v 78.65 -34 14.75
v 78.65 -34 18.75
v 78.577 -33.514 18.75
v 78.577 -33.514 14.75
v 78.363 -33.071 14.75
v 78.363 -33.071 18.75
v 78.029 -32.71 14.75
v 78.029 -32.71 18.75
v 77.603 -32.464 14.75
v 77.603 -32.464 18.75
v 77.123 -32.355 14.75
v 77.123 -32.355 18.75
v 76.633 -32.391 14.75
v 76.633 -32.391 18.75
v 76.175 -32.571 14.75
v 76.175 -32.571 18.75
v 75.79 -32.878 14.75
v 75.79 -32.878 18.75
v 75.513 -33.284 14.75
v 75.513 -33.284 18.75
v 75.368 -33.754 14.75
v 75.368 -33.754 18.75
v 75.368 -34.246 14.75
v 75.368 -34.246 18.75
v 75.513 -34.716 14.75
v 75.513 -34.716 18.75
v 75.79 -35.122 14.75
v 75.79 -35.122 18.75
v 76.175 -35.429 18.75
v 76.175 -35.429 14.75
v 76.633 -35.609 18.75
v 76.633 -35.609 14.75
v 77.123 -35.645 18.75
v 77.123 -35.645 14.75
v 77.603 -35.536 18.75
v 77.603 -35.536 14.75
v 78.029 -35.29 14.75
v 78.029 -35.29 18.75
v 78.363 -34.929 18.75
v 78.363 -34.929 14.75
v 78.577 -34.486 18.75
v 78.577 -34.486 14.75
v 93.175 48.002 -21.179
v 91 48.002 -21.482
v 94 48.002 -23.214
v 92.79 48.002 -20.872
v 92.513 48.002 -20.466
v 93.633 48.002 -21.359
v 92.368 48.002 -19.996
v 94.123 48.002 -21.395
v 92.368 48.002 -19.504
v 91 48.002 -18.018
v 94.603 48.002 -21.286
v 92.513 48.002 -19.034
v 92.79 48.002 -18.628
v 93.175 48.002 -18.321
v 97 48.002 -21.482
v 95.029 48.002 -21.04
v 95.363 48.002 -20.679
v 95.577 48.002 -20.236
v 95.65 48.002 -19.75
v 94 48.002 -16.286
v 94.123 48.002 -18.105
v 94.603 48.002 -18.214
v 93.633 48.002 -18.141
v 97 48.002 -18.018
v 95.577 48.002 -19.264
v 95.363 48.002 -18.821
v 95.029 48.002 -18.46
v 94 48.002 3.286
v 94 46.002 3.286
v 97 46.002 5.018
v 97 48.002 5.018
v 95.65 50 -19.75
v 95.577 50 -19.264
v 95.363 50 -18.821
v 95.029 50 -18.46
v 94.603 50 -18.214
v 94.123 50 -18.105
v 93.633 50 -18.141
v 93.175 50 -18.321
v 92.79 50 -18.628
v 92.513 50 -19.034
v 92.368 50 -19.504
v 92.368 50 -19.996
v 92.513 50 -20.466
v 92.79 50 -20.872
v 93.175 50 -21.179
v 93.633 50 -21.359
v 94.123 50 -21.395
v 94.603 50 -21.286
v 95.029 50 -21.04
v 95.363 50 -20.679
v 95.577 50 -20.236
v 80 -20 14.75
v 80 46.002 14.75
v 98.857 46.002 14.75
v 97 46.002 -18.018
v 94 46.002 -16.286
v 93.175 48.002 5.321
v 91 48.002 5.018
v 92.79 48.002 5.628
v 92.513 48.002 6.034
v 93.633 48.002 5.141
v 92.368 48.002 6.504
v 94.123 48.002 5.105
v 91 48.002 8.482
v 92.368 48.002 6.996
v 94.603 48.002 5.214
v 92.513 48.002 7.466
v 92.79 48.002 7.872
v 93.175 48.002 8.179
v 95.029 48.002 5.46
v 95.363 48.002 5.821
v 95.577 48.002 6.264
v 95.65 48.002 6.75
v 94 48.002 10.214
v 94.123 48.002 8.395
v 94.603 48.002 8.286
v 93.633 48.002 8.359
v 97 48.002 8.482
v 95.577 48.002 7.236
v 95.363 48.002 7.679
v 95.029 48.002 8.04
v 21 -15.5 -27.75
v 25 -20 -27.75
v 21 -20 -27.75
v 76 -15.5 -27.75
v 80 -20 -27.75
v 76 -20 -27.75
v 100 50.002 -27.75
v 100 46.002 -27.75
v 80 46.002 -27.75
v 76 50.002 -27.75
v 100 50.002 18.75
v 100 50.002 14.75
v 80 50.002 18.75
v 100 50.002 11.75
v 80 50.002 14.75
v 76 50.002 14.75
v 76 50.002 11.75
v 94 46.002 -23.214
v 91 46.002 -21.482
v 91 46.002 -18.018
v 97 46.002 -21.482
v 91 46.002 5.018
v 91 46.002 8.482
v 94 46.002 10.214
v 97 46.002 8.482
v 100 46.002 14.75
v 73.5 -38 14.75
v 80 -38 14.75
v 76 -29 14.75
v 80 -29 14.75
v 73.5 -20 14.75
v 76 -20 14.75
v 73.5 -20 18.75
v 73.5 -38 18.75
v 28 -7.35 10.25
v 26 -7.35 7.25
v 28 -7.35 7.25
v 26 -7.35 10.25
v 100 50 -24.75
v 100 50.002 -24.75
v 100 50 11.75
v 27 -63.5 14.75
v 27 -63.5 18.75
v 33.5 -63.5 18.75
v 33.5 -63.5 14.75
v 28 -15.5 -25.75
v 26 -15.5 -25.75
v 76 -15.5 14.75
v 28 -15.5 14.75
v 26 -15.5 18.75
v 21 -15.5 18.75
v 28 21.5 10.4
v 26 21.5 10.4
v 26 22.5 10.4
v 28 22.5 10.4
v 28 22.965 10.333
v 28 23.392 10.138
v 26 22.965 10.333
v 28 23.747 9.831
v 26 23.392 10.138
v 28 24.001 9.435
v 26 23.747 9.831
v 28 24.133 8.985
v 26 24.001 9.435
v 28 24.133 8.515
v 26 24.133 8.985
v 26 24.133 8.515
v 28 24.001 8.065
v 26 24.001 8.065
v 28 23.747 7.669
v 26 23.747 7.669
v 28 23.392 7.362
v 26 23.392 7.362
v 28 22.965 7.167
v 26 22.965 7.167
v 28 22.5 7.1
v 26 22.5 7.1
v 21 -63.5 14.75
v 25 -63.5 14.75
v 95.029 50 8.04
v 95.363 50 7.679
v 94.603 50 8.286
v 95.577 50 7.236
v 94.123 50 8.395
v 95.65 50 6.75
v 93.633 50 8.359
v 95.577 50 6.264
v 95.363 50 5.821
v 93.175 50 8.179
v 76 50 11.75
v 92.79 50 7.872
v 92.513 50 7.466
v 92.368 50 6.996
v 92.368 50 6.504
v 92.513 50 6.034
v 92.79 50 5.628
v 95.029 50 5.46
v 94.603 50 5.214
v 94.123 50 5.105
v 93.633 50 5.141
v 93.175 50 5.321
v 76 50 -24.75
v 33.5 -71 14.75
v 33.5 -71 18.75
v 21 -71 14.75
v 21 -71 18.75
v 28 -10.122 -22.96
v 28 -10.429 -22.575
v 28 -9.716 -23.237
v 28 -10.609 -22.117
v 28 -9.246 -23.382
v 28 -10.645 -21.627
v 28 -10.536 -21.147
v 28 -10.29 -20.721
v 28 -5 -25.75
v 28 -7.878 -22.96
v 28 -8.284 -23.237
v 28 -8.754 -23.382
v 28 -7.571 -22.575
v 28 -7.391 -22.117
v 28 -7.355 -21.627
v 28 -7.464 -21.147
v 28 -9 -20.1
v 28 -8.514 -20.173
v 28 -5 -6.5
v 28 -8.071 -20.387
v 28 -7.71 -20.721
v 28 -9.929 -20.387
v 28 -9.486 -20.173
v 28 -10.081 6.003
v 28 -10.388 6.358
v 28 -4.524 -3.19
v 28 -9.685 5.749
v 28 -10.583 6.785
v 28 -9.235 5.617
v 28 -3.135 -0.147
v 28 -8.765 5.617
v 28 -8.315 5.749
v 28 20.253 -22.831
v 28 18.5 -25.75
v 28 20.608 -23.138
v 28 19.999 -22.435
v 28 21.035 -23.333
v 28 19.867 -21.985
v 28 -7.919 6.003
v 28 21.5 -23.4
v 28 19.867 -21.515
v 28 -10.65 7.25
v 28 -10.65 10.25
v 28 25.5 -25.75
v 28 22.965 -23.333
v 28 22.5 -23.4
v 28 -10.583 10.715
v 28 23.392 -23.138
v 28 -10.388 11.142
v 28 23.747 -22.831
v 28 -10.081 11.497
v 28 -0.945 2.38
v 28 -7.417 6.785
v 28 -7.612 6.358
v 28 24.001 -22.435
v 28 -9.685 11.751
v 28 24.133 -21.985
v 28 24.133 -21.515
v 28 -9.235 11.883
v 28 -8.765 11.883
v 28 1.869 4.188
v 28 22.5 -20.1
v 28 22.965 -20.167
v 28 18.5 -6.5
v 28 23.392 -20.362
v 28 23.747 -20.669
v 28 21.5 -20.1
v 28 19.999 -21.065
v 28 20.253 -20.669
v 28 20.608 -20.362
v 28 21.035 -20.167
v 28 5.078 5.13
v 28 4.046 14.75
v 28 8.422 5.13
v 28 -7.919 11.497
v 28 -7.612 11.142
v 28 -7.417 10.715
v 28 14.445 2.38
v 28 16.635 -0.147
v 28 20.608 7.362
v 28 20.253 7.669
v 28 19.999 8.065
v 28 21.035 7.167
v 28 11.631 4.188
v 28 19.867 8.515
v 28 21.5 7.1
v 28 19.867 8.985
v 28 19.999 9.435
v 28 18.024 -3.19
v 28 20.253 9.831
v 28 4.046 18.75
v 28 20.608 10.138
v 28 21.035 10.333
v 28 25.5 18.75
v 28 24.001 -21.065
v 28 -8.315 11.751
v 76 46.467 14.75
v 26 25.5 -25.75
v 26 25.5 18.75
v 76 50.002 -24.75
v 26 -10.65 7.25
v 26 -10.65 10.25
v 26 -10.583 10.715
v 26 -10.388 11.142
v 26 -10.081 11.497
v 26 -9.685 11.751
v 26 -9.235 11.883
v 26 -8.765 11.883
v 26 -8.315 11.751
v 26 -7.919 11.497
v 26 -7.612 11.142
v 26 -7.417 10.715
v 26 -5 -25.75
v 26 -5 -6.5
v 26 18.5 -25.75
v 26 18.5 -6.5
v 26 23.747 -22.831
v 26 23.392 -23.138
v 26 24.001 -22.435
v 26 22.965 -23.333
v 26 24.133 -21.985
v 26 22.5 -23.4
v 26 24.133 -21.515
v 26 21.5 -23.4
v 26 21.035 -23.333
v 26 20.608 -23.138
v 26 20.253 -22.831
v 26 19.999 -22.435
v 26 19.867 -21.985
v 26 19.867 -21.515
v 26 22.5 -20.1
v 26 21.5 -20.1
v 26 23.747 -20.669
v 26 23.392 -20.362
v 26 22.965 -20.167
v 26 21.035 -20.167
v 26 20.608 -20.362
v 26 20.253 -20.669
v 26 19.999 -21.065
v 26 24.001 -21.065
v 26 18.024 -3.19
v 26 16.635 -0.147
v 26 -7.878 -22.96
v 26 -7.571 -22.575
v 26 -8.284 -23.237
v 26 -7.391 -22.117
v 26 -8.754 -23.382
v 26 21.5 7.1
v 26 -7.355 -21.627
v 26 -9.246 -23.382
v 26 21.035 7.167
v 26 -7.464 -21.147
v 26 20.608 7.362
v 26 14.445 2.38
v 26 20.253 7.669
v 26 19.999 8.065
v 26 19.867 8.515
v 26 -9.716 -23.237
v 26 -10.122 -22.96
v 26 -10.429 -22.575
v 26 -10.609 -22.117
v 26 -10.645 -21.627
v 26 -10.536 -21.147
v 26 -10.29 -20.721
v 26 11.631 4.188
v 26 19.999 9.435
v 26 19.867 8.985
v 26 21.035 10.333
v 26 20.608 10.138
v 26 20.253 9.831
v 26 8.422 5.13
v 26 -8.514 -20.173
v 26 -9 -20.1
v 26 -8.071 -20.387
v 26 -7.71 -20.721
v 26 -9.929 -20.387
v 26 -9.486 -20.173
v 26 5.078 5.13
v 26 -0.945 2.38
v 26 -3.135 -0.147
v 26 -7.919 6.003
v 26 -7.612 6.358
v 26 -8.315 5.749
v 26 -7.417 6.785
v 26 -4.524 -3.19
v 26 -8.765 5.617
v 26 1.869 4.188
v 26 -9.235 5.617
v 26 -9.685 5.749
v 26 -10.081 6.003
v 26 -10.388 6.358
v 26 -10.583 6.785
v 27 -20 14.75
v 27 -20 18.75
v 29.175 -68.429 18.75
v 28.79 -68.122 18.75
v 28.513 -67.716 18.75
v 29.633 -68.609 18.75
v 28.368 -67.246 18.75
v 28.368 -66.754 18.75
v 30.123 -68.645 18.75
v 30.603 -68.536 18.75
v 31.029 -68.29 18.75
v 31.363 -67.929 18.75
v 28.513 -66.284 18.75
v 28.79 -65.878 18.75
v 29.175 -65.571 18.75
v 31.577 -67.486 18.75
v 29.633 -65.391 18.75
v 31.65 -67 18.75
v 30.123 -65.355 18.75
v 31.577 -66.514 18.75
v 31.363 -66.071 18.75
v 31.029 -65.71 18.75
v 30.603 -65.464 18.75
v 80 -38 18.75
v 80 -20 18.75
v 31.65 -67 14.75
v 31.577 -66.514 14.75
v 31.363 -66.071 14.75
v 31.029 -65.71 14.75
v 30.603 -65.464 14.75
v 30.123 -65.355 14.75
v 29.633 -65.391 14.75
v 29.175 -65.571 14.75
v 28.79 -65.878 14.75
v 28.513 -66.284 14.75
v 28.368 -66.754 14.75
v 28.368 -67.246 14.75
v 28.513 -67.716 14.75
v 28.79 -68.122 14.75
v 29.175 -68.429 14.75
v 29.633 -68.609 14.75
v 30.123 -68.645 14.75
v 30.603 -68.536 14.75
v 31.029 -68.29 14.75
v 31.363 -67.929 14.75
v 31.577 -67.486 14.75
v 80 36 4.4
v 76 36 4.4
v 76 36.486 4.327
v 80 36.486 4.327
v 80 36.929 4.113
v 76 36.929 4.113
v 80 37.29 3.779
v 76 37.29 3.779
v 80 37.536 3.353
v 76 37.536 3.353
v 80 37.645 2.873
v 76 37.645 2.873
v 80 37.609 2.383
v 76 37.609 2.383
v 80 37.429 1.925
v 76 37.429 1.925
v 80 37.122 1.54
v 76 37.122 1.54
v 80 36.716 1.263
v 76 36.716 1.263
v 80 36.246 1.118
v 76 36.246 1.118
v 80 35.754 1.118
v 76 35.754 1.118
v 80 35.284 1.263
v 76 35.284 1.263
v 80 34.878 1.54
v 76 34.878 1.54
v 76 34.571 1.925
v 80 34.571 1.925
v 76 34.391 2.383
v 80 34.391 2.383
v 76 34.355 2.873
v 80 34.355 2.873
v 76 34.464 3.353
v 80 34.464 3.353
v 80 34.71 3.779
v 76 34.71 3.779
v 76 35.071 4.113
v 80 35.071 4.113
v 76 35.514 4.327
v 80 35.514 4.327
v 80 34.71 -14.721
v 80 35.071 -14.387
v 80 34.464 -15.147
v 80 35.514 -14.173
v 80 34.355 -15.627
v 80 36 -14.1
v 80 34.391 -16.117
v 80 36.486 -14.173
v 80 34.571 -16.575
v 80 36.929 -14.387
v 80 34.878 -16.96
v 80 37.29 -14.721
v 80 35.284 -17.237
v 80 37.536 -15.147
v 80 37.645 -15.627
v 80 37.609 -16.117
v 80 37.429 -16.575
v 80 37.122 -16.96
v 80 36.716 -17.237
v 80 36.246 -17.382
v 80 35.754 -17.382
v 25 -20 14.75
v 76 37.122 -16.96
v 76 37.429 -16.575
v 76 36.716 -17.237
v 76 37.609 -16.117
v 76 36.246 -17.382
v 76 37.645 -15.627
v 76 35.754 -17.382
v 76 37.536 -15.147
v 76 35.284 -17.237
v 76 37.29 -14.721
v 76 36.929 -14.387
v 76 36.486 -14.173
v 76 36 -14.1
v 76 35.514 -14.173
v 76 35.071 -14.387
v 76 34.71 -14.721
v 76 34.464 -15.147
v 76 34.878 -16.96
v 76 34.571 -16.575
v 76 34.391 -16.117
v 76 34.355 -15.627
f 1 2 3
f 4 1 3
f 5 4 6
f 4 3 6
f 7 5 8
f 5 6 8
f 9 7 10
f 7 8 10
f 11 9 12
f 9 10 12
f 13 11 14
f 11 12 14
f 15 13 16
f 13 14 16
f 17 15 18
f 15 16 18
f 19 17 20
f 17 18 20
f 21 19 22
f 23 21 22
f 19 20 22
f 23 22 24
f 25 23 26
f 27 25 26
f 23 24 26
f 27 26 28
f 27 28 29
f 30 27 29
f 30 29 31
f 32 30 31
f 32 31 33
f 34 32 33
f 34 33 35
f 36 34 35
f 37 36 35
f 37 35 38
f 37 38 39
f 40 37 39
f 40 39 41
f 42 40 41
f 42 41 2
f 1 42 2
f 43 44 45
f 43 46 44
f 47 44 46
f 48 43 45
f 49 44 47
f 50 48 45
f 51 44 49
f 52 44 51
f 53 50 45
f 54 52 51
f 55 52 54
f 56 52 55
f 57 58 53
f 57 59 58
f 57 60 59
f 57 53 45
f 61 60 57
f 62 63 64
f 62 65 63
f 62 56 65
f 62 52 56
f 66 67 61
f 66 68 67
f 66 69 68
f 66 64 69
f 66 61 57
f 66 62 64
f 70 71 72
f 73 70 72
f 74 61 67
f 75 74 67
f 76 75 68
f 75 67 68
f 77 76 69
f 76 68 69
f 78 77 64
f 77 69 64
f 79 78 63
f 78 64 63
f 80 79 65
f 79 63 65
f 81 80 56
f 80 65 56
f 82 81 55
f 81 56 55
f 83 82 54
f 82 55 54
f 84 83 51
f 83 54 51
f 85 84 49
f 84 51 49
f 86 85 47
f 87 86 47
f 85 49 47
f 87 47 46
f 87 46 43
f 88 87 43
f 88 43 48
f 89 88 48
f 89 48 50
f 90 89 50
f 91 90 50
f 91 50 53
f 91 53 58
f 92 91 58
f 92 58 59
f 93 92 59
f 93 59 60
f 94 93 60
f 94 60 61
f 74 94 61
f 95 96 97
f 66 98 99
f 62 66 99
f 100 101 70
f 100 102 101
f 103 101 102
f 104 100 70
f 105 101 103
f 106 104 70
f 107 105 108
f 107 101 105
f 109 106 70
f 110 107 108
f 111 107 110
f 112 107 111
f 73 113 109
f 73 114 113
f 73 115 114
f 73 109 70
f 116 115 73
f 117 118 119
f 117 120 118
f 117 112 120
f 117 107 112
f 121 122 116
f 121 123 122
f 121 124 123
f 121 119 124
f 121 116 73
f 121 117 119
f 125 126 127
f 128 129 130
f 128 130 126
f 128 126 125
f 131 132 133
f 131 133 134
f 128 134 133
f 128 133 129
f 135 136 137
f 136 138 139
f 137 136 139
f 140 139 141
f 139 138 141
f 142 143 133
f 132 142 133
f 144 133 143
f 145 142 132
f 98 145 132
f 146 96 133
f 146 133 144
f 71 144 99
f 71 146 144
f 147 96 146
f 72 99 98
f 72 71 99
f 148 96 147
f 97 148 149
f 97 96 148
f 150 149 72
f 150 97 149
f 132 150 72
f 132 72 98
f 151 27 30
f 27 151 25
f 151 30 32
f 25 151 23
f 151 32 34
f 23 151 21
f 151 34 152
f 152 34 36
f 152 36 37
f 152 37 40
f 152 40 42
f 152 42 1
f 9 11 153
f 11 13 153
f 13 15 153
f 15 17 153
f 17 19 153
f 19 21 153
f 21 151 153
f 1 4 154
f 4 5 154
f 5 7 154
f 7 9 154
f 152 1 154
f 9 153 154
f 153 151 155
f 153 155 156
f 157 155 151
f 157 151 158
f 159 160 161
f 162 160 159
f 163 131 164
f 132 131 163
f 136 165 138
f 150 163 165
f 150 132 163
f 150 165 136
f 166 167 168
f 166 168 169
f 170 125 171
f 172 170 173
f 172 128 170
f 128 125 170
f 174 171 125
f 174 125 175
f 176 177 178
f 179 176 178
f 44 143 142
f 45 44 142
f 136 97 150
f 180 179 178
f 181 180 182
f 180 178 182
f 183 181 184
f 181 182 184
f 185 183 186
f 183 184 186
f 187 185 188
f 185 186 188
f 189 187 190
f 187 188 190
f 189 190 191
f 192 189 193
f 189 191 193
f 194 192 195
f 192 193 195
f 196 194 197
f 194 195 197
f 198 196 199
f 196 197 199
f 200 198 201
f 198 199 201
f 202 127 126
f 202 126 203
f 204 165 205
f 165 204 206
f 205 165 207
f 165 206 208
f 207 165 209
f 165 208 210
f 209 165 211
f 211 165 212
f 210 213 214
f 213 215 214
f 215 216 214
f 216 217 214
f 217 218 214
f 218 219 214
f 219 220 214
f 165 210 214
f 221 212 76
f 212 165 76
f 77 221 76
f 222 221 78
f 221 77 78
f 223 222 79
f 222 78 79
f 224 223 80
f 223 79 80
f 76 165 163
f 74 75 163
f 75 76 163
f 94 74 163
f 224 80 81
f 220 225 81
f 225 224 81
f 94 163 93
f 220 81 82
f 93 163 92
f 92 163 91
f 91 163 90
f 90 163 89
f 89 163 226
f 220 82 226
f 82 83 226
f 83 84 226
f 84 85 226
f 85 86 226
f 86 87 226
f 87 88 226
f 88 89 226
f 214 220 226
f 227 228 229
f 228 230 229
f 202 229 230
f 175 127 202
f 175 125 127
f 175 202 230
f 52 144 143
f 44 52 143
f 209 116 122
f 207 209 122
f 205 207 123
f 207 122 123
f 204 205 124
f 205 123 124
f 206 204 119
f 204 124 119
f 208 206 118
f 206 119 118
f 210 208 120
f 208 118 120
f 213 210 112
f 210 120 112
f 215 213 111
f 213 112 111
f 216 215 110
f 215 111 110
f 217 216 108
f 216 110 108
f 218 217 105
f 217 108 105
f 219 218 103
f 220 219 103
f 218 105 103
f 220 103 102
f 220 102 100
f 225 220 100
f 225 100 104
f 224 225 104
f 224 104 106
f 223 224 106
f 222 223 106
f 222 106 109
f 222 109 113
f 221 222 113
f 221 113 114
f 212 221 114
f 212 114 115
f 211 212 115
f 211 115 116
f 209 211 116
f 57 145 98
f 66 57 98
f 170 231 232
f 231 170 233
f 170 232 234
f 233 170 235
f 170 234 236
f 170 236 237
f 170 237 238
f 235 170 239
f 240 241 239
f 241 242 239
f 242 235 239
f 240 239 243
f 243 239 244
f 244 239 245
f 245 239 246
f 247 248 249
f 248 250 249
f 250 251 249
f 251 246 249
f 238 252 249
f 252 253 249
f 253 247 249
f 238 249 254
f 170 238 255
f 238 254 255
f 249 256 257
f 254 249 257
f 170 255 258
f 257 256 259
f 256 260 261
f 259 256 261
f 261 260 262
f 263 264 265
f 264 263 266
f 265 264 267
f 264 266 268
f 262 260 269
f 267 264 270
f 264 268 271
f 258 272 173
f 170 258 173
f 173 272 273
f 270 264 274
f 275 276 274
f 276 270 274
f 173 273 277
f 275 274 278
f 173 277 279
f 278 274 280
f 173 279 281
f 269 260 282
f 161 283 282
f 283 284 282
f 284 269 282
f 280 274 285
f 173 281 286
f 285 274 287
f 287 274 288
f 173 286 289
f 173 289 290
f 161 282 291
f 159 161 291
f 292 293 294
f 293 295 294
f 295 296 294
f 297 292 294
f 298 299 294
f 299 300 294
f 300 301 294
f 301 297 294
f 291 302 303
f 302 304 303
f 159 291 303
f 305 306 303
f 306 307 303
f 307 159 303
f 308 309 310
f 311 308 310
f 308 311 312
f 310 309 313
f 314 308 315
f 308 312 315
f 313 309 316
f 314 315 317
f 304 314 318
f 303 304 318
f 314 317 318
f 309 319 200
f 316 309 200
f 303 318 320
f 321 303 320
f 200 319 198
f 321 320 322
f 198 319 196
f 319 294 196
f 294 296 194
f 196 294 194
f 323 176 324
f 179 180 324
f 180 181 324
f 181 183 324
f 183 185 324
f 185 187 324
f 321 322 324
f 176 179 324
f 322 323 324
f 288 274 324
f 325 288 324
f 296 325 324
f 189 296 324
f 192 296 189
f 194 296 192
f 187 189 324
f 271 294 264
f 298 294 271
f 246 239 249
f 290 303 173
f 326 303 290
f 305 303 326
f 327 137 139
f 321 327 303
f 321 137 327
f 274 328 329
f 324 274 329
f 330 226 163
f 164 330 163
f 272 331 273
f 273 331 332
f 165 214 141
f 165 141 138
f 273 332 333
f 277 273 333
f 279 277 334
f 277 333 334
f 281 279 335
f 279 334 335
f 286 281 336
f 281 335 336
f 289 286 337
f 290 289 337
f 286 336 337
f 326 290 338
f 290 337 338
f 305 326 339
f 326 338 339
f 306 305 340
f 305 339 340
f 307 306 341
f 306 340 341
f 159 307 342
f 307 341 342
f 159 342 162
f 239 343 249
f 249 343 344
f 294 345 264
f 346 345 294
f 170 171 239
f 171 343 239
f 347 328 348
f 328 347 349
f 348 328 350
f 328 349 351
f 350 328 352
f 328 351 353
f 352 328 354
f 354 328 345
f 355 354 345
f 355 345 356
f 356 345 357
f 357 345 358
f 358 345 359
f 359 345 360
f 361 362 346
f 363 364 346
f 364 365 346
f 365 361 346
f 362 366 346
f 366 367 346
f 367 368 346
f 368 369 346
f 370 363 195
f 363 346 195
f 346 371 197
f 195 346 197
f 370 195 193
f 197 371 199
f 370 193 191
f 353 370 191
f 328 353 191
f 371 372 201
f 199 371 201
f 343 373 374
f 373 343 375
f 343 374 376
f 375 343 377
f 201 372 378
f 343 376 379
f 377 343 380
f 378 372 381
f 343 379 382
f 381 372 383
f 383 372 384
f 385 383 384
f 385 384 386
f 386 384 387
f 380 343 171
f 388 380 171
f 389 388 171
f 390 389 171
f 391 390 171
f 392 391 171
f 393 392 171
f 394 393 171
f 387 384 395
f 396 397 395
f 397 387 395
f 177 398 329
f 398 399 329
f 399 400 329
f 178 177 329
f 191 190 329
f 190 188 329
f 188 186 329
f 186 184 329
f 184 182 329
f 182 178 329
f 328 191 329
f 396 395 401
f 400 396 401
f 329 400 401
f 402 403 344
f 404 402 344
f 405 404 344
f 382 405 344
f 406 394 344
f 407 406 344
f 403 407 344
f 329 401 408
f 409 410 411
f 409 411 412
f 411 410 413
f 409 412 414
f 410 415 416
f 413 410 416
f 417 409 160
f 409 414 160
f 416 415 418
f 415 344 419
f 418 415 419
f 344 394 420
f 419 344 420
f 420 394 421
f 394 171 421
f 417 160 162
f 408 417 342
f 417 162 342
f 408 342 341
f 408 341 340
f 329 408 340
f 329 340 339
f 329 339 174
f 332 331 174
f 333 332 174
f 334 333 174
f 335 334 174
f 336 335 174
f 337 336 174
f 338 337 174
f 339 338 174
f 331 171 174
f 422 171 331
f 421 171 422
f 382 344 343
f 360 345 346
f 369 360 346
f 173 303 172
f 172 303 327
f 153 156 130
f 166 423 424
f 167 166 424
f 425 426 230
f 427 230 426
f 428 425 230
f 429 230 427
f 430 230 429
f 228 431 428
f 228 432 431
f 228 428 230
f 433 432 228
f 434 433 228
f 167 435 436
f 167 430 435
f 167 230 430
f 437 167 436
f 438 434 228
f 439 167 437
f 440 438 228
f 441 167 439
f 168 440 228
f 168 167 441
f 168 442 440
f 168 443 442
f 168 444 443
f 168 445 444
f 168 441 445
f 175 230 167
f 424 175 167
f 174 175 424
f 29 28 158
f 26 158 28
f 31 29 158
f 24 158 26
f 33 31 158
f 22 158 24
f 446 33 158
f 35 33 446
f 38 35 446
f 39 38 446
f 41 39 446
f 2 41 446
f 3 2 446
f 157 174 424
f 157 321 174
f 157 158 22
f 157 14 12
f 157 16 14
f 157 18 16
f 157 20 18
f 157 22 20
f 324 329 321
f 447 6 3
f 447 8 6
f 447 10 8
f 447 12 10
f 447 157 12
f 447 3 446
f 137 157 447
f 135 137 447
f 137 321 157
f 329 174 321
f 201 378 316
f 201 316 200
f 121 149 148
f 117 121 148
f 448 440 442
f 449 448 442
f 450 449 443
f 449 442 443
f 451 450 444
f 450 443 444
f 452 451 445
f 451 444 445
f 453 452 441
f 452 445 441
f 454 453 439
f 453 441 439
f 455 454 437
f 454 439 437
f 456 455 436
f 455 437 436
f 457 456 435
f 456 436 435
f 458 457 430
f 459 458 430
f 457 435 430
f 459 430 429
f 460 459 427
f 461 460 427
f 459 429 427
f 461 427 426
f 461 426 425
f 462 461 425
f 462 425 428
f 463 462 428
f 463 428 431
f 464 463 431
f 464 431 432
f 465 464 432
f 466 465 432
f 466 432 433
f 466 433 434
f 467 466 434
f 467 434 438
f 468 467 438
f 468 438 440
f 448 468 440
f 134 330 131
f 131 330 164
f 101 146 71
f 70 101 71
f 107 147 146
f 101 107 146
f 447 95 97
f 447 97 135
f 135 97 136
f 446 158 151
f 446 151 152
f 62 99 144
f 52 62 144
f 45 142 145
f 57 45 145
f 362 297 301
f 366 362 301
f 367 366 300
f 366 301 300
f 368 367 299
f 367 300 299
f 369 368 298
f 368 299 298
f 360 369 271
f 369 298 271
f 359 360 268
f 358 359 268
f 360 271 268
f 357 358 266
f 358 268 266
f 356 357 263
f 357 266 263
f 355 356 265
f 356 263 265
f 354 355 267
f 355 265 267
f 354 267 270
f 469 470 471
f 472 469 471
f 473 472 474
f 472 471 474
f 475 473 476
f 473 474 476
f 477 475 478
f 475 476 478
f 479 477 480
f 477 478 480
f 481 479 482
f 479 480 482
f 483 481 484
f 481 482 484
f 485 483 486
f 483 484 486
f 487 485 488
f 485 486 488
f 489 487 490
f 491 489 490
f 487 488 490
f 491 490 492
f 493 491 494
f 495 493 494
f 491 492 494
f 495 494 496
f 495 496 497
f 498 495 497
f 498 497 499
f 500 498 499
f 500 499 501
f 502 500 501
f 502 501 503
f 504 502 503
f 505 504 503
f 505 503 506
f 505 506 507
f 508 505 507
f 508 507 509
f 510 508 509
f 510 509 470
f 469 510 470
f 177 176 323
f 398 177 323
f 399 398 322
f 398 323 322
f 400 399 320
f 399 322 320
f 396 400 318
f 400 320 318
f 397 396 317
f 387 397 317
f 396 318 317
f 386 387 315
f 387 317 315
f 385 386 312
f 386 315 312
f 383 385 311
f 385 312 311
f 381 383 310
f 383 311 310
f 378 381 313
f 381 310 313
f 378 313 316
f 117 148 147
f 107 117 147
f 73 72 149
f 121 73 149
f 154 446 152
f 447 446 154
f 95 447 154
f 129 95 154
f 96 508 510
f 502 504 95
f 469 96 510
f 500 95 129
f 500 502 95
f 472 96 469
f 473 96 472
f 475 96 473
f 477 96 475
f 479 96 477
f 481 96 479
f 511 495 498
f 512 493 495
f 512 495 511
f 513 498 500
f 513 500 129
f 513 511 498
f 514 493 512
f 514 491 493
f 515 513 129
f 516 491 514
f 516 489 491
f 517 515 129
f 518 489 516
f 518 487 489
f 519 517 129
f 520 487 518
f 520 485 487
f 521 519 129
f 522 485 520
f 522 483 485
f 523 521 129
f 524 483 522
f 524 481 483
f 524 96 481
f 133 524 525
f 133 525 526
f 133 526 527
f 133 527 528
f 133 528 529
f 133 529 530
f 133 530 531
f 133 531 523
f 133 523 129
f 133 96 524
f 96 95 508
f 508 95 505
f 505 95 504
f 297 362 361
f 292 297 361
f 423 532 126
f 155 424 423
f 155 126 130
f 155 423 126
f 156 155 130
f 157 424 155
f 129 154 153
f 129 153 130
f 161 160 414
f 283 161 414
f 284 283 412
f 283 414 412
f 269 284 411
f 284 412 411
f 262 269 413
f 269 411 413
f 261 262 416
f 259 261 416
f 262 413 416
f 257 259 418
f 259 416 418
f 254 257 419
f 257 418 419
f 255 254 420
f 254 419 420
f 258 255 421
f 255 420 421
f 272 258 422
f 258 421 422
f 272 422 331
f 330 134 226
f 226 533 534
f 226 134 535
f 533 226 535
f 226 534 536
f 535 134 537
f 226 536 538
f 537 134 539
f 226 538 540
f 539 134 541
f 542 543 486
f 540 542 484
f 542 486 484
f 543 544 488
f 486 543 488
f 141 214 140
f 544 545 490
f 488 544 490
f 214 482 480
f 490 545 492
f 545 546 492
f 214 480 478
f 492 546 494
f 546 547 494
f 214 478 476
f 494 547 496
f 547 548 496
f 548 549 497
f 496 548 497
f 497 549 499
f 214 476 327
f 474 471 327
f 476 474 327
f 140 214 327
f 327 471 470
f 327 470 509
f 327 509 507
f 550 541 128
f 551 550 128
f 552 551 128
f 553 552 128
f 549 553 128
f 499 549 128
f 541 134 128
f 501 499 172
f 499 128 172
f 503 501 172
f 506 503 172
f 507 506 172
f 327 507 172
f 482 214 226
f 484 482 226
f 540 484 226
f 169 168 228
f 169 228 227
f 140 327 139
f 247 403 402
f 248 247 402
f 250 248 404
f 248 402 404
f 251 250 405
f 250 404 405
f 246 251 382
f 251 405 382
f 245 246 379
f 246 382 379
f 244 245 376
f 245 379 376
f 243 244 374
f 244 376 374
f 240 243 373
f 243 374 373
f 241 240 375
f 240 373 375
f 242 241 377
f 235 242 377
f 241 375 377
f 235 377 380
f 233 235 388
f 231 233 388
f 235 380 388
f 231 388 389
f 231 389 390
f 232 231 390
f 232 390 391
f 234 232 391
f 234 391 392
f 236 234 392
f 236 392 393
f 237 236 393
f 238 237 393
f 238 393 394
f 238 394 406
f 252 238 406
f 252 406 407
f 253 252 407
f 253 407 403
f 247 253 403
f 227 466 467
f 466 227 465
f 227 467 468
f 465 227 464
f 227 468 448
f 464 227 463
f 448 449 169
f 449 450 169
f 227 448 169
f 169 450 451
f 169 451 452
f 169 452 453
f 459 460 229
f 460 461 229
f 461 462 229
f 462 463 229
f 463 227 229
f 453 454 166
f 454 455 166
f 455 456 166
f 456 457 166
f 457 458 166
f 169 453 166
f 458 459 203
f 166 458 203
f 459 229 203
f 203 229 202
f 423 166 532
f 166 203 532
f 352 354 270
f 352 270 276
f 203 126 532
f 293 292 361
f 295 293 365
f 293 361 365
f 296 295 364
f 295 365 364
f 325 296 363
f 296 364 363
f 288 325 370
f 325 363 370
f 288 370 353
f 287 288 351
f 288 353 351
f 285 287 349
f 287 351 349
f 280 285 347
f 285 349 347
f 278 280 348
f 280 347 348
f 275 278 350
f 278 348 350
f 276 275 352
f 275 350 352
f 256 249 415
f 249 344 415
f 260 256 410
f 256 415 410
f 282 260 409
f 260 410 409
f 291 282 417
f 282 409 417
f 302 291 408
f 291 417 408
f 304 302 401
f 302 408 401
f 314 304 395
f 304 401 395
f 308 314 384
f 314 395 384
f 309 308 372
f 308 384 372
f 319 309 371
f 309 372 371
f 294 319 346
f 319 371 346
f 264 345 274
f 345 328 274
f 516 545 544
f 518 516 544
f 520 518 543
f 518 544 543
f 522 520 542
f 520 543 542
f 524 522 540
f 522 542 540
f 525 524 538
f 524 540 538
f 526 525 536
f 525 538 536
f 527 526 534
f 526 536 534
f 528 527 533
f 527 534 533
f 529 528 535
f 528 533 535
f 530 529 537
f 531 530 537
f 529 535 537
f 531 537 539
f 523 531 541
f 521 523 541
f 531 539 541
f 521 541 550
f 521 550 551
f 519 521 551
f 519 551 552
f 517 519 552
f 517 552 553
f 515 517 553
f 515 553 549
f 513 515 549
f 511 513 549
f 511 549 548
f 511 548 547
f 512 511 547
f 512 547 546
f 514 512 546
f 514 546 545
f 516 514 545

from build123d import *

# Parameters (mm, degrees)
SKETCH1_W                 = 13
SKETCH1_H                 = 16
BOSS_EXTRUDE1_DEPTH       = 4
SKETCH2_R                 = 1.65
CUT_EXTRUDE1_DEPTH        = 10
SKETCH3_W                 = 4
SKETCH3_H                 = 13
BOSS_EXTRUDE2_DEPTH       = 4
SKETCH4_W                 = 13
SKETCH4_H                 = 4
BOSS_EXTRUDE3_DEPTH       = 60
SKETCH6_W                 = 4
SKETCH6_H                 = 21
SKETCH6_H_2               = 13
BOSS_EXTRUDE4_DEPTH       = 28
SKETCH12_W                = 4
SKETCH12_H                = 28
BOSS_EXTRUDE8_DEPTH       = 1.65
SKETCH13_W                = 4
SKETCH13_H                = 28
BOSS_EXTRUDE9_DEPTH       = 1.65
SKETCH14_W                = 4
SKETCH14_H                = 35.878399396
CUT_EXTRUDE5_DEPTH        = 24
SKETCH15_R                = 1.65
CUT_EXTRUDE6_DEPTH        = 24
SKETCH16_W                = 4
SKETCH16_H                = 11.121600604
SKETCH16_H_2              = 11.3
BOSS_EXTRUDE10_DEPTH      = 29.15
SKETCH17_R                = 1.65
CUT_EXTRUDE8_DEPTH        = 29.15
SKETCH18_W                = 22.65
SKETCH18_H                = 4
SKETCH18_W_2              = 13
BOSS_EXTRUDE11_DEPTH      = 4
SKETCH19_W                = 4
SKETCH19_H                = 20
BOSS_EXTRUDE12_DEPTH      = 40
SKETCH20_R                = 1.65
CUT_EXTRUDE9_DEPTH        = 40
SKETCH21_W                = 4
SKETCH21_H                = 30.5
BOSS_EXTRUDE13_DEPTH      = 38.5
SKETCH23_W                = 4
SKETCH23_H                = 4
BOSS_EXTRUDE14_DEPTH      = 38.5
SKETCH24_W                = 4
SKETCH24_H                = 38.5
BOSS_EXTRUDE15_DEPTH      = 3
SKETCH27_W                = 4
SKETCH27_H                = 58.3
CUT_EXTRUDE10_DEPTH       = 100
SKETCH29_W                = 38.5
SKETCH29_H                = 7
BOSS_EXTRUDE16_DEPTH      = 40
BOSS_EXTRUDE16_DEPTH_BACK = 28
SKETCH30_R                = 1.65
CUT_EXTRUDE11_DEPTH       = 40
SKETCH31_W                = 4
SKETCH31_H                = 22.5
CUT_EXTRUDE12_DEPTH       = 38.5
SKETCH32_W                = 38.5
SKETCH32_H                = 2.5
CUT_EXTRUDE13_DEPTH       = 40
SKETCH33_W                = 4
SKETCH33_H                = 8
BOSS_EXTRUDE17_DEPTH      = 8
SKETCH34_R                = 1.65
CUT_EXTRUDE14_DEPTH       = 8
SKETCH35_W                = 4
SKETCH35_H                = 43.5
BOSS_EXTRUDE18_DEPTH      = 13
CUT_EXTRUDE15_START       = -20
SKETCH36_W                = 10
SKETCH36_H                = 80
CUT_EXTRUDE15_DEPTH       = 20
SKETCH37_W                = 5
SKETCH37_H                = 7
BOSS_EXTRUDE19_DEPTH      = 4
SKETCH41_W                = 13
SKETCH41_H                = 20
BOSS_EXTRUDE20_DEPTH      = 4
SKETCH42_R                = 1.65
CUT_EXTRUDE18_DEPTH       = 4
SKETCH43_W                = 4
SKETCH43_H                = 38.5
CUT_EXTRUDE19_DEPTH       = 10
SKETCH44_W                = 8
SKETCH44_H                = 9
BOSS_EXTRUDE21_DEPTH      = 4
SKETCH45_R                = 1.65
CUT_EXTRUDE20_DEPTH       = 4
CUT_EXTRUDE21_DEPTH       = 3
SKETCH49_R                = 1.65
CUT_EXTRUDE22_DEPTH       = 5
SKETCH54_W                = 1
SKETCH54_H                = 38.5
CUT_EXTRUDE24_DEPTH       = 50
SKETCH55_W                = 8
SKETCH55_H                = 10
BOSS_EXTRUDE22_DEPTH      = 4
SKETCH56_R                = 1.65
CUT_EXTRUDE25_DEPTH       = 4
SKETCH57_W                = 25
SKETCH57_H                = 70
CUT_EXTRUDE26_DEPTH       = 15
CUT_EXTRUDE26_DEPTH_BACK  = 10
SKETCH58_W                = 47.5
SKETCH58_H                = 38.5
BOSS_EXTRUDE24_DEPTH      = 4.5
SKETCH59_W                = 0.5
SKETCH59_H                = 38.5
BOSS_EXTRUDE25_DEPTH      = 4.5
SKETCH60_W                = 4
SKETCH60_H                = 38.5
BOSS_EXTRUDE26_DEPTH      = 69.5
SKETCH61_W                = 38.5
SKETCH61_H                = 2.457662878
BOSS_EXTRUDE27_DEPTH      = 20
SKETCH62_W                = 38.5
SKETCH62_H                = 2
BOSS_EXTRUDE31_DEPTH      = 29.5
SKETCH64_W                = 4
SKETCH64_H                = 13
BOSS_EXTRUDE32_DEPTH      = 16
SKETCH65_R                = 1.65
CUT_EXTRUDE27_DEPTH       = 16
SKETCH66_W                = 24
SKETCH66_H                = 0.5
BOSS_EXTRUDE33_DEPTH      = 38.5
SKETCH69_W                = 20
SKETCH69_H                = 38.5
BOSS_EXTRUDE34_DEPTH      = 1.04
SKETCH70_R                = 1.65
CUT_EXTRUDE29_DEPTH       = 10
SKETCH72_W                = 2
SKETCH72_H                = 38.5
CUT_EXTRUDE31_DEPTH       = 60
SKETCH73_W                = 22.5
SKETCH73_H                = 38.5
BOSS_EXTRUDE35_DEPTH      = 2
SKETCH74_R                = 11.25
CUT_EXTRUDE32_DEPTH       = 2
SKETCH76_R                = 1.65
CUT_EXTRUDE34_DEPTH       = 5
SKETCH77_W                = 35
SKETCH77_H                = 30
CUT_EXTRUDE35_DEPTH       = 1000
SKETCH78_R                = 11.75
CUT_EXTRUDE36_DEPTH       = 10
SKETCH79_W                = 19.25
SKETCH79_H                = 23.5
CUT_EXTRUDE37_DEPTH       = 10
SKETCH80_R                = 1.65
CUT_EXTRUDE38_DEPTH       = 10
SKETCH81_W                = 3.3
SKETCH81_H                = 1
CUT_EXTRUDE39_DEPTH       = 10
CUT_EXTRUDE41_DEPTH       = 2
SKETCH83_W                = 54
SKETCH83_H                = 42.5
BOSS_EXTRUDE37_DEPTH      = 4.5
SKETCH84_W                = 2
SKETCH84_H                = 61.502337122
BOSS_EXTRUDE38_DEPTH      = 4
SKETCH85_W                = 24
SKETCH85_H                = 3
BOSS_EXTRUDE40_DEPTH      = 4
BOSS_EXTRUDE41_DEPTH      = 4
BOSS_EXTRUDE42_DEPTH      = 4
SKETCH89_W                = 6
SKETCH89_H                = 45.5
BOSS_EXTRUDE43_DEPTH      = 2
BOSS_EXTRUDE44_DEPTH      = 4
SKETCH91_R                = 1.65
CUT_EXTRUDE42_DEPTH       = 10
SKETCH92_R                = 1.65
CUT_EXTRUDE43_DEPTH       = 10
SKETCH93_W                = 3
SKETCH93_H                = 3.3
CUT_EXTRUDE44_DEPTH       = 10
SKETCH95_W                = 46.5
SKETCH95_H                = 4.5
BOSS_EXTRUDE45_DEPTH      = 5
SKETCH96_W                = 7.3
SKETCH96_H                = 4
BOSS_EXTRUDE47_DEPTH      = 18
SKETCH99_R                = 1.65
CUT_EXTRUDE47_DEPTH       = 18
SKETCH100_W               = 6
SKETCH100_H               = 4
BOSS_EXTRUDE48_DEPTH      = 51
SKETCH101_W               = 4
SKETCH101_H               = 7.5
BOSS_EXTRUDE50_DEPTH      = 6.5
SKETCH103_R               = 1.65
CUT_EXTRUDE48_DEPTH       = 6.5
SKETCH104_W               = 7.3
SKETCH104_H               = 18
CUT_EXTRUDE49_DEPTH       = 6.5
SKETCH105_W               = 6.5
SKETCH105_H               = 4
BOSS_EXTRUDE51_DEPTH      = 18
SKETCH106_R               = 1.65
CUT_EXTRUDE50_DEPTH       = 18
BOSS_EXTRUDE52_DEPTH      = 4
BOSS_EXTRUDE53_DEPTH      = 4


with BuildPart() as part:
    # Sketch1 → Boss-Extrude1 (new body)
    with BuildSketch(Plane(origin=(0, 0, 0), x_dir=(0, 0, -1), z_dir=(1, 0, 0))):
        with Locations((6.5, -8)):
            Rectangle(SKETCH1_W, SKETCH1_H)
    extrude(amount=BOSS_EXTRUDE1_DEPTH)

    # Sketch2 → Cut-Extrude1 (cut)
    with BuildSketch(Plane(origin=(4, 0, 0), x_dir=(0, 0, -1), z_dir=(1, 0, 0))):
        with Locations((6.5, -4)):
            Circle(SKETCH2_R)
        with Locations((6.5, -12)):
            Circle(SKETCH2_R)
    extrude(amount=-CUT_EXTRUDE1_DEPTH, mode=Mode.SUBTRACT)

    # Sketch3 → Boss-Extrude2 (add)
    with BuildSketch(Plane.XZ.offset(16)):
        with Locations((2, -6.5)):
            Rectangle(SKETCH3_W, SKETCH3_H)
    extrude(amount=BOSS_EXTRUDE2_DEPTH)

    # Sketch4 → Boss-Extrude3 (add)
    with BuildSketch(Plane(origin=(4, 0, 0), x_dir=(0, 0, -1), z_dir=(1, 0, 0))):
        with Locations((6.5, -18)):
            Rectangle(SKETCH4_W, SKETCH4_H)
    extrude(amount=BOSS_EXTRUDE3_DEPTH)

    # Sketch6 → Boss-Extrude4 (add)
    with BuildSketch(Plane(origin=(0, -16, 0), x_dir=(1, 0, 0), z_dir=(0, 1, 0))):
        with Locations((62, -10.5)):
            Rectangle(SKETCH6_W, SKETCH6_H)
        with Locations((62, 23.5)):
            Rectangle(SKETCH6_W, SKETCH6_H)
        with Locations((62, 6.5)):
            Rectangle(SKETCH6_W, SKETCH6_H_2)
    extrude(amount=BOSS_EXTRUDE4_DEPTH)

    # Sketch12 → Boss-Extrude8 (add)
    with BuildSketch(Plane(origin=(0, 0, -34), x_dir=(-1, 0, 0), z_dir=(0, 0, -1))):
        with Locations((-62, -2)):
            Rectangle(SKETCH12_W, SKETCH12_H)
    extrude(amount=BOSS_EXTRUDE8_DEPTH)

    # Sketch13 → Boss-Extrude9 (add)
    with BuildSketch(Plane.XY.offset(21)):
        with Locations((62, -2)):
            Rectangle(SKETCH13_W, SKETCH13_H)
    extrude(amount=BOSS_EXTRUDE9_DEPTH)

    # Sketch14 → Cut-Extrude5 (cut)
    with BuildSketch(Plane(origin=(0, 12, 0), x_dir=(1, 0, 0), z_dir=(0, 1, 0))):
        with Locations((62, 6.410800302)):
            Rectangle(SKETCH14_W, SKETCH14_H)
    extrude(amount=-CUT_EXTRUDE5_DEPTH, mode=Mode.SUBTRACT)

    # Sketch15 → Cut-Extrude6 (cut)
    with BuildSketch(Plane(origin=(64, 0, 0), x_dir=(0, 0, -1), z_dir=(1, 0, 0))):
        with Locations((-17, -11.5)):
            Circle(SKETCH15_R)
        with Locations((30, -11.5)):
            Circle(SKETCH15_R)
    extrude(amount=-CUT_EXTRUDE6_DEPTH, mode=Mode.SUBTRACT)

    # Sketch16 → Boss-Extrude10 (add)
    with BuildSketch(Plane(origin=(0, 12, 0), x_dir=(1, 0, 0), z_dir=(0, 1, 0))):
        with Locations((62, -17.089199698)):
            Rectangle(SKETCH16_W, SKETCH16_H)
        with Locations((62, 30)):
            Rectangle(SKETCH16_W, SKETCH16_H_2)
    extrude(amount=BOSS_EXTRUDE10_DEPTH)

    # Sketch17 → Cut-Extrude8 (cut)
    with BuildSketch(Plane(origin=(64, 0, 0), x_dir=(0, 0, -1), z_dir=(1, 0, 0))):
        with Locations((-17, 35.5)):
            Circle(SKETCH17_R)
        with Locations((30, 35.5)):
            Circle(SKETCH17_R)
    extrude(amount=-CUT_EXTRUDE8_DEPTH, mode=Mode.SUBTRACT)

    # Sketch18 → Boss-Extrude11 (add)
    with BuildSketch(Plane(origin=(64, 0, 0), x_dir=(0, 0, -1), z_dir=(1, 0, 0))):
        with Locations((-11.325, -18)):
            Rectangle(SKETCH18_W, SKETCH18_H)
        with Locations((24.325, -18)):
            Rectangle(SKETCH18_W, SKETCH18_H)
        with Locations((6.5, -18)):
            Rectangle(SKETCH18_W_2, SKETCH18_H)
    extrude(amount=-BOSS_EXTRUDE11_DEPTH)

    # Sketch19 → Boss-Extrude12 (add)
    with BuildSketch(Plane(origin=(0, 0, -13), x_dir=(-1, 0, 0), z_dir=(0, 0, -1))):
        with Locations((-2, -10)):
            Rectangle(SKETCH19_W, SKETCH19_H)
    extrude(amount=BOSS_EXTRUDE12_DEPTH)

    # Sketch20 → Cut-Extrude9 (cut)
    with BuildSketch(Plane.ZY):
        with Locations((-46.5, -4)):
            Circle(SKETCH20_R)
        with Locations((-46.5, -12)):
            Circle(SKETCH20_R)
    extrude(amount=-CUT_EXTRUDE9_DEPTH, mode=Mode.SUBTRACT)

    # Sketch21 → Boss-Extrude13 (add)
    with BuildSketch(Plane(origin=(0, -16, 0), x_dir=(1, 0, 0), z_dir=(0, 1, 0))):
        with Locations((26, 6.5)):
            Rectangle(SKETCH21_W, SKETCH21_H)
    extrude(amount=BOSS_EXTRUDE13_DEPTH)

    # Sketch23 → Boss-Extrude14 (add)
    with BuildSketch(Plane(origin=(0, 22.5, 0), x_dir=(1, 0, 0), z_dir=(0, 1, 0))):
        with Locations((26, 23.75)):
            Rectangle(SKETCH23_W, SKETCH23_H)
        with Locations((26, -10.75)):
            Rectangle(SKETCH23_W, SKETCH23_H)
    extrude(amount=-BOSS_EXTRUDE14_DEPTH)

    # Sketch24 → Boss-Extrude15 (add)
    with BuildSketch(Plane(origin=(0, 22.5, 0), x_dir=(1, 0, 0), z_dir=(0, 1, 0))):
        with Locations((26, 6.5)):
            Rectangle(SKETCH24_W, SKETCH24_H)
    extrude(amount=BOSS_EXTRUDE15_DEPTH)

    # Sketch27 → Cut-Extrude10 (cut)
    with BuildSketch(Plane.XZ.offset(20)):
        with Locations((62, -6.5)):
            Rectangle(SKETCH27_W, SKETCH27_H)
    extrude(amount=-CUT_EXTRUDE10_DEPTH, mode=Mode.SUBTRACT)

    # Sketch29 → Boss-Extrude16 (add, two sides)
    with BuildSketch(Plane(origin=(28, 0, 0), x_dir=(0, 0, -1), z_dir=(1, 0, 0))) as boss_extrude16_sk:
        with Locations((6.5, -16.5)):
            Rectangle(SKETCH29_W, SKETCH29_H)
    extrude(amount=BOSS_EXTRUDE16_DEPTH)
    extrude(boss_extrude16_sk.sketch, amount=-BOSS_EXTRUDE16_DEPTH_BACK)

    # Sketch30 → Cut-Extrude11 (cut)
    with BuildSketch(Plane.ZY.offset(-24)):
        with Locations((8.75, 21.5)):
            Circle(SKETCH30_R)
        with Locations((8.75, -9)):
            Circle(SKETCH30_R)
        with Locations((-21.75, 21.5)):
            Circle(SKETCH30_R)
        with Locations((-21.75, -9)):
            Circle(SKETCH30_R)
    extrude(amount=-CUT_EXTRUDE11_DEPTH, mode=Mode.SUBTRACT)

    # Sketch31 → Cut-Extrude12 (cut)
    with BuildSketch(Plane(origin=(0, 25.5, 0), x_dir=(1, 0, 0), z_dir=(0, 1, 0))):
        with Locations((26, 6.5)):
            Rectangle(SKETCH31_W, SKETCH31_H)
    extrude(amount=-CUT_EXTRUDE12_DEPTH, mode=Mode.SUBTRACT)

    # Sketch32 → Cut-Extrude13 (cut)
    with BuildSketch(Plane(origin=(68, 0, 0), x_dir=(0, 0, -1), z_dir=(1, 0, 0))):
        with Locations((6.5, -14.25)):
            Rectangle(SKETCH32_W, SKETCH32_H)
    extrude(amount=-CUT_EXTRUDE13_DEPTH, mode=Mode.SUBTRACT)

    # Sketch33 → Boss-Extrude17 (add)
    with BuildSketch(Plane(origin=(0, 25.5, 0), x_dir=(1, 0, 0), z_dir=(0, 1, 0))):
        with Locations((26, -8.75)):
            Rectangle(SKETCH33_W, SKETCH33_H)
        with Locations((26, 21.75)):
            Rectangle(SKETCH33_W, SKETCH33_H)
    extrude(amount=-BOSS_EXTRUDE17_DEPTH)

    # Sketch34 → Cut-Extrude14 (cut)
    with BuildSketch(Plane(origin=(28, 0, 0), x_dir=(0, 0, -1), z_dir=(1, 0, 0))):
        with Locations((-8.75, 21.5)):
            Circle(SKETCH34_R)
        with Locations((21.75, 21.5)):
            Circle(SKETCH34_R)
    extrude(amount=-CUT_EXTRUDE14_DEPTH, mode=Mode.SUBTRACT)

    # Sketch35 → Boss-Extrude18 (add)
    with BuildSketch(Plane(origin=(0, -13, 0), x_dir=(1, 0, 0), z_dir=(0, 1, 0))):
        with Locations((12, 9)):
            Rectangle(SKETCH35_W, SKETCH35_H)
    extrude(amount=BOSS_EXTRUDE18_DEPTH)

    # Sketch36 → Cut-Extrude15 (cut)
    with BuildSketch(Plane.XZ.offset(20).offset(CUT_EXTRUDE15_START)):
        with Locations((5, -27.25)):
            Rectangle(SKETCH36_W, SKETCH36_H)
    extrude(amount=CUT_EXTRUDE15_DEPTH, mode=Mode.SUBTRACT)

    # Sketch37 → Boss-Extrude19 (add)
    with BuildSketch(Plane.ZY.offset(-10)):
        with Locations((-28.25, -16.5)):
            Rectangle(SKETCH37_W, SKETCH37_H)
    extrude(amount=-BOSS_EXTRUDE19_DEPTH)

    # Sketch41 → Boss-Extrude20 (add)
    with BuildSketch(Plane(origin=(14, 0, 0), x_dir=(0, 0, -1), z_dir=(1, 0, 0))):
        with Locations((32.25, -10)):
            Rectangle(SKETCH41_W, SKETCH41_H)
    extrude(amount=-BOSS_EXTRUDE20_DEPTH)

    # Sketch42 → Cut-Extrude18 (cut)
    with BuildSketch(Plane.ZY.offset(-10)):
        with Locations((-32.25, -4)):
            Circle(SKETCH42_R)
        with Locations((-32.25, -12)):
            Circle(SKETCH42_R)
    extrude(amount=-CUT_EXTRUDE18_DEPTH, mode=Mode.SUBTRACT)

    # Sketch43 → Cut-Extrude19 (cut)
    with BuildSketch(Plane(origin=(0, 0, 0), x_dir=(1, 0, 0), z_dir=(0, 1, 0))):
        with Locations((12, 6.5)):
            Rectangle(SKETCH43_W, SKETCH43_H)
    extrude(amount=-CUT_EXTRUDE19_DEPTH, mode=Mode.SUBTRACT)

    # Sketch44 → Boss-Extrude21 (add)
    with BuildSketch(Plane(origin=(28, 0, 0), x_dir=(0, 0, -1), z_dir=(1, 0, 0))):
        with Locations((-8.75, -11)):
            Rectangle(SKETCH44_W, SKETCH44_H)
        with Locations((21.75, -11)):
            Rectangle(SKETCH44_W, SKETCH44_H)
    extrude(amount=-BOSS_EXTRUDE21_DEPTH)

    # Sketch45 → Cut-Extrude20 (cut)
    with BuildSketch(Plane.ZY.offset(-24)):
        with Locations((-21.75, -7)):
            Circle(SKETCH45_R)
        with Locations((8.75, -7)):
            Circle(SKETCH45_R)
    extrude(amount=-CUT_EXTRUDE20_DEPTH, mode=Mode.SUBTRACT)

    # Sketch46 → Cut-Extrude21 (cut)
    with BuildSketch(Plane(origin=(0, -15.5, 0), x_dir=(1, 0, 0), z_dir=(0, 1, 0))):
        Polygon((64, 18.285898385), (67, 20.017949192), (67, 23.482050808), (64, 25.214101615), (61, 23.482050808), (61, 20.017949192), align=None)
        Polygon((64, -12.214101615), (67, -10.482050808), (67, -7.017949192), (64, -5.285898385), (61, -7.017949192), (61, -10.482050808), align=None)
    extrude(amount=-CUT_EXTRUDE21_DEPTH, mode=Mode.SUBTRACT)

    # Sketch49 → Cut-Extrude22 (cut)
    with BuildSketch(Plane(origin=(0, -15.5, 0), x_dir=(1, 0, 0), z_dir=(0, 1, 0))):
        with Locations((64, 21.75)):
            Circle(SKETCH49_R)
        with Locations((64, -8.75)):
            Circle(SKETCH49_R)
    extrude(amount=-CUT_EXTRUDE22_DEPTH, mode=Mode.SUBTRACT)

    # Sketch54 → Cut-Extrude24 (cut)
    with BuildSketch(Plane(origin=(0, -10, 0), x_dir=(1, 0, 0), z_dir=(0, 1, 0))):
        with Locations((10.5, 6.5)):
            Rectangle(SKETCH54_W, SKETCH54_H)
    extrude(amount=-CUT_EXTRUDE24_DEPTH, mode=Mode.SUBTRACT)

    # Sketch55 → Boss-Extrude22 (add)
    with BuildSketch(Plane.ZY.offset(-24)):
        with Locations((8.75, -8)):
            Rectangle(SKETCH55_W, SKETCH55_H)
        with Locations((-21.75, -8)):
            Rectangle(SKETCH55_W, SKETCH55_H)
    extrude(amount=-BOSS_EXTRUDE22_DEPTH)

    # Sketch56 → Cut-Extrude25 (cut)
    with BuildSketch(Plane.ZY.offset(-24)):
        with Locations((-21.75, -9)):
            Circle(SKETCH56_R)
        with Locations((8.75, -9)):
            Circle(SKETCH56_R)
    extrude(amount=-CUT_EXTRUDE25_DEPTH, mode=Mode.SUBTRACT)

    # Sketch57 → Cut-Extrude26 (cut, two sides)
    with BuildSketch(Plane(origin=(0, -13, 0), x_dir=(1, 0, 0), z_dir=(0, 1, 0))) as cut_extrude26_sk:
        with Locations((11.5, 22.25)):
            Rectangle(SKETCH57_W, SKETCH57_H)
    extrude(amount=CUT_EXTRUDE26_DEPTH, mode=Mode.SUBTRACT)
    extrude(cut_extrude26_sk.sketch, amount=-CUT_EXTRUDE26_DEPTH_BACK, mode=Mode.SUBTRACT)

    # Sketch58 → Boss-Extrude24 (add)
    with BuildSketch(Plane.XZ.offset(20)):
        with Locations((51.75, -6.5)):
            Rectangle(SKETCH58_W, SKETCH58_H)
    extrude(amount=-BOSS_EXTRUDE24_DEPTH)

    # Sketch59 → Boss-Extrude25 (add)
    with BuildSketch(Plane.XZ.offset(20)):
        with Locations((75.75, -6.5)):
            Rectangle(SKETCH59_W, SKETCH59_H)
    extrude(amount=-BOSS_EXTRUDE25_DEPTH)

    # Sketch60 → Boss-Extrude26 (add)
    with BuildSketch(Plane.XZ.offset(20)):
        with Locations((78, -6.5)):
            Rectangle(SKETCH60_W, SKETCH60_H)
    extrude(amount=-BOSS_EXTRUDE26_DEPTH)

    # Sketch61 → Boss-Extrude27 (add)
    with BuildSketch(Plane(origin=(80, 0, 0), x_dir=(0, 0, -1), z_dir=(1, 0, 0))):
        with Locations((6.5, 48.271168561)):
            Rectangle(SKETCH61_W, SKETCH61_H)
    extrude(amount=BOSS_EXTRUDE27_DEPTH)

    # Sketch62 → Boss-Extrude31 (add)
    with BuildSketch(Plane.ZY.offset(-76)):
        with Locations((-6.5, 29)):
            Rectangle(SKETCH62_W, SKETCH62_H)
    extrude(amount=BOSS_EXTRUDE31_DEPTH)

    # Sketch64 → Boss-Extrude32 (add)
    with BuildSketch(Plane(origin=(0, 30, 0), x_dir=(1, 0, 0), z_dir=(0, 1, 0))):
        with Locations((48.5, 6.5)):
            Rectangle(SKETCH64_W, SKETCH64_H)
    extrude(amount=BOSS_EXTRUDE32_DEPTH)

    # Sketch65 → Cut-Extrude27 (cut)
    with BuildSketch(Plane.ZY.offset(-46.5)):
        with Locations((-6.5, 34)):
            Circle(SKETCH65_R)
        with Locations((-6.5, 42)):
            Circle(SKETCH65_R)
    extrude(amount=-CUT_EXTRUDE27_DEPTH, mode=Mode.SUBTRACT)

    # Sketch66 → Boss-Extrude33 (add)
    with BuildSketch(Plane(origin=(0, 0, -25.75), x_dir=(-1, 0, 0), z_dir=(0, 0, -1))):
        with Locations((-88, 49.75)):
            Rectangle(SKETCH66_W, SKETCH66_H)
    extrude(amount=-BOSS_EXTRUDE33_DEPTH)

    # Sketch69 → Boss-Extrude34 (add)
    with BuildSketch(Plane.XZ.offset(-47.042337122)):
        with Locations((90, -6.5)):
            Rectangle(SKETCH69_W, SKETCH69_H)
    extrude(amount=BOSS_EXTRUDE34_DEPTH)

    # Sketch70 → Cut-Extrude29 (cut)
    with BuildSketch(Plane.XZ.offset(-46.002337122)):
        with Locations((94, 6.75)):
            Circle(SKETCH70_R)
        with Locations((94, -19.75)):
            Circle(SKETCH70_R)
    extrude(amount=-CUT_EXTRUDE29_DEPTH, mode=Mode.SUBTRACT)

    # Sketch72 → Cut-Extrude31 (cut)
    with BuildSketch(Plane.XZ.offset(20)):
        with Locations((25, -6.5)):
            Rectangle(SKETCH72_W, SKETCH72_H)
    extrude(amount=-CUT_EXTRUDE31_DEPTH, mode=Mode.SUBTRACT)

    # Sketch73 → Boss-Extrude35 (add)
    with BuildSketch(Plane.ZY.offset(-26)):
        with Locations((-6.5, 6.25)):
            Rectangle(SKETCH73_W, SKETCH73_H)
    extrude(amount=-BOSS_EXTRUDE35_DEPTH)

    # Sketch74 → Cut-Extrude32 (cut)
    with BuildSketch(Plane.ZY.offset(-26)):
        with Locations((-6.5, 6.25)):
            Circle(SKETCH74_R)
    extrude(amount=-CUT_EXTRUDE32_DEPTH, mode=Mode.SUBTRACT)

    # Sketch76 → Cut-Extrude34 (cut)
    with BuildSketch(Plane.ZY.offset(-76)):
        with Locations((2.75, 36)):
            Circle(SKETCH76_R)
        with Locations((-15.75, 36)):
            Circle(SKETCH76_R)
    extrude(amount=-CUT_EXTRUDE34_DEPTH, mode=Mode.SUBTRACT)

    # Sketch77 → Cut-Extrude35 (cut)
    with BuildSketch(Plane.XY.offset(12.75)):
        with Locations((58.5, 43)):
            Rectangle(SKETCH77_W, SKETCH77_H)
    extrude(amount=-CUT_EXTRUDE35_DEPTH, mode=Mode.SUBTRACT)

    # Sketch78 → Cut-Extrude36 (cut)
    with BuildSketch(Plane.ZY.offset(-26)):
        with Locations((-6.5, 6.75)):
            Circle(SKETCH78_R)
    extrude(amount=-CUT_EXTRUDE36_DEPTH, mode=Mode.SUBTRACT)

    # Sketch79 → Cut-Extrude37 (cut)
    with BuildSketch(Plane.ZY.offset(-26)):
        with Locations((-16.125, 6.75)):
            Rectangle(SKETCH79_W, SKETCH79_H)
    extrude(amount=-CUT_EXTRUDE37_DEPTH, mode=Mode.SUBTRACT)

    # Sketch80 → Cut-Extrude38 (cut)
    with BuildSketch(Plane.ZY.offset(-26)):
        with Locations((8.75, 22.5)):
            Circle(SKETCH80_R)
        with Locations((-21.75, 22.5)):
            Circle(SKETCH80_R)
    extrude(amount=-CUT_EXTRUDE38_DEPTH, mode=Mode.SUBTRACT)

    # Sketch81 → Cut-Extrude39 (cut)
    with BuildSketch(Plane.ZY.offset(-26)):
        with Locations((8.75, 22)):
            Rectangle(SKETCH81_W, SKETCH81_H)
        with Locations((-21.75, 22)):
            Rectangle(SKETCH81_W, SKETCH81_H)
    extrude(amount=-CUT_EXTRUDE39_DEPTH, mode=Mode.SUBTRACT)

    # Sketch82 → Cut-Extrude41 (cut)
    with BuildSketch(Plane.XZ.offset(-46.002337122)):
        Polygon((97, -18.017949192), (94, -16.285898385), (91, -18.017949192), (91, -21.482050808), (94, -23.214101615), (97, -21.482050808), align=None)
        Polygon((97, 8.482050808), (94, 10.214101615), (91, 8.482050808), (91, 5.017949192), (94, 3.285898385), (97, 5.017949192), align=None)
    extrude(amount=-CUT_EXTRUDE41_DEPTH, mode=Mode.SUBTRACT)

    # Sketch83 → Boss-Extrude37 (add)
    with BuildSketch(Plane.XZ.offset(20)):
        with Locations((53, -6.5)):
            Rectangle(SKETCH83_W, SKETCH83_H)
    extrude(amount=-BOSS_EXTRUDE37_DEPTH)

    # Sketch84 → Boss-Extrude38 (add)
    with BuildSketch(Plane(origin=(80, 0, 0), x_dir=(0, 0, -1), z_dir=(1, 0, 0))):
        with Locations((26.75, 15.251168561)):
            Rectangle(SKETCH84_W, SKETCH84_H)
        with Locations((-13.75, 15.251168561)):
            Rectangle(SKETCH84_W, SKETCH84_H)
    extrude(amount=-BOSS_EXTRUDE38_DEPTH)

    # Sketch85 → Boss-Extrude40 (add)
    with BuildSketch(Plane.XZ.offset(-46.002337122)):
        with Locations((88, -26.25)):
            Rectangle(SKETCH85_W, SKETCH85_H)
        with Locations((88, 13.25)):
            Rectangle(SKETCH85_W, SKETCH85_H)
    extrude(amount=-BOSS_EXTRUDE40_DEPTH)

    # Sketch87 → Boss-Extrude41 (add)
    with BuildSketch(Plane.XY.offset(14.75)):
        Polygon((80, 50.002337122), (26, -20), (80, -20), align=None)
    extrude(amount=BOSS_EXTRUDE41_DEPTH)

    # Sketch88 → Boss-Extrude42 (add)
    with BuildSketch(Plane.XY.offset(14.75)):
        Polygon((80, -20), (100, 50.002337122), (80, 50.002337122), align=None)
    extrude(amount=BOSS_EXTRUDE42_DEPTH)

    # Sketch89 → Boss-Extrude43 (add)
    with BuildSketch(Plane.ZY.offset(-26)):
        with Locations((15.75, 2.75)):
            Rectangle(SKETCH89_W, SKETCH89_H)
    extrude(amount=-BOSS_EXTRUDE43_DEPTH)

    # Sketch90 → Boss-Extrude44 (add)
    with BuildSketch(Plane.XY.offset(18.75)):
        Polygon((28, -17.407320847), (80, 50.002337122), (28, 4.046339576), align=None)
    extrude(amount=-BOSS_EXTRUDE44_DEPTH)

    # Sketch91 → Cut-Extrude42 (cut)
    with BuildSketch(Plane.ZY.offset(-26)):
        with Locations((10.25, -9)):
            Circle(SKETCH91_R)
    extrude(amount=-CUT_EXTRUDE42_DEPTH, mode=Mode.SUBTRACT)

    # Sketch92 → Cut-Extrude43 (cut)
    with BuildSketch(Plane.ZY.offset(-26)):
        with Locations((7.25, -9)):
            Circle(SKETCH92_R)
    extrude(amount=-CUT_EXTRUDE43_DEPTH, mode=Mode.SUBTRACT)

    # Sketch93 → Cut-Extrude44 (cut)
    with BuildSketch(Plane.ZY.offset(-26)):
        with Locations((8.75, -9)):
            Rectangle(SKETCH93_W, SKETCH93_H)
    extrude(amount=-CUT_EXTRUDE44_DEPTH, mode=Mode.SUBTRACT)

    # Sketch95 → Boss-Extrude45 (add)
    with BuildSketch(Plane.ZY.offset(-26)):
        with Locations((-4.5, -17.75)):
            Rectangle(SKETCH95_W, SKETCH95_H)
    extrude(amount=BOSS_EXTRUDE45_DEPTH)

    # Sketch96 → Boss-Extrude47 (add)
    with BuildSketch(Plane.XZ.offset(20)):
        with Locations((76.35, 16.75)):
            Rectangle(SKETCH96_W, SKETCH96_H)
    extrude(amount=BOSS_EXTRUDE47_DEPTH)

    # Sketch99 → Cut-Extrude47 (cut)
    with BuildSketch(Plane.XY.offset(18.75)):
        with Locations((76.35, -34)):
            Circle(SKETCH99_R)
    extrude(amount=-CUT_EXTRUDE47_DEPTH, mode=Mode.SUBTRACT)

    # Sketch100 → Boss-Extrude48 (add)
    with BuildSketch(Plane.XZ.offset(20)):
        with Locations((24, 16.75)):
            Rectangle(SKETCH100_W, SKETCH100_H)
    extrude(amount=BOSS_EXTRUDE48_DEPTH)

    # Sketch101 → Boss-Extrude50 (add)
    with BuildSketch(Plane(origin=(27, 0, 0), x_dir=(0, 0, -1), z_dir=(1, 0, 0))):
        with Locations((-16.75, -67.25)):
            Rectangle(SKETCH101_W, SKETCH101_H)
    extrude(amount=BOSS_EXTRUDE50_DEPTH)

    # Sketch103 → Cut-Extrude48 (cut)
    with BuildSketch(Plane.XY.offset(18.75)):
        with Locations((30, -67)):
            Circle(SKETCH103_R)
    extrude(amount=-CUT_EXTRUDE48_DEPTH, mode=Mode.SUBTRACT)

    # Sketch104 → Cut-Extrude49 (cut)
    with BuildSketch(Plane.XY.offset(18.75)):
        with Locations((76.35, -29)):
            Rectangle(SKETCH104_W, SKETCH104_H)
    extrude(amount=-CUT_EXTRUDE49_DEPTH, mode=Mode.SUBTRACT)

    # Sketch105 → Boss-Extrude51 (add)
    with BuildSketch(Plane.XZ.offset(20)):
        with Locations((76.75, 16.75)):
            Rectangle(SKETCH105_W, SKETCH105_H)
    extrude(amount=BOSS_EXTRUDE51_DEPTH)

    # Sketch106 → Cut-Extrude50 (cut)
    with BuildSketch(Plane.XY.offset(18.75)):
        with Locations((77, -34)):
            Circle(SKETCH106_R)
    extrude(amount=-CUT_EXTRUDE50_DEPTH, mode=Mode.SUBTRACT)

    # Sketch107 → Boss-Extrude52 (add)
    with BuildSketch(Plane(origin=(80, 0, 0), x_dir=(0, 0, -1), z_dir=(1, 0, 0))):
        Polygon((-14.75, -29), (27.75, -20), (-14.75, -20), align=None)
    extrude(amount=-BOSS_EXTRUDE52_DEPTH)

    # Sketch110 → Boss-Extrude53 (add)
    with BuildSketch(Plane.ZY.offset(-21)):
        Polygon((-27.75, -20), (14.75, -63.5), (14.75, -20), align=None)
    extrude(amount=-BOSS_EXTRUDE53_DEPTH)


solid = part.part
